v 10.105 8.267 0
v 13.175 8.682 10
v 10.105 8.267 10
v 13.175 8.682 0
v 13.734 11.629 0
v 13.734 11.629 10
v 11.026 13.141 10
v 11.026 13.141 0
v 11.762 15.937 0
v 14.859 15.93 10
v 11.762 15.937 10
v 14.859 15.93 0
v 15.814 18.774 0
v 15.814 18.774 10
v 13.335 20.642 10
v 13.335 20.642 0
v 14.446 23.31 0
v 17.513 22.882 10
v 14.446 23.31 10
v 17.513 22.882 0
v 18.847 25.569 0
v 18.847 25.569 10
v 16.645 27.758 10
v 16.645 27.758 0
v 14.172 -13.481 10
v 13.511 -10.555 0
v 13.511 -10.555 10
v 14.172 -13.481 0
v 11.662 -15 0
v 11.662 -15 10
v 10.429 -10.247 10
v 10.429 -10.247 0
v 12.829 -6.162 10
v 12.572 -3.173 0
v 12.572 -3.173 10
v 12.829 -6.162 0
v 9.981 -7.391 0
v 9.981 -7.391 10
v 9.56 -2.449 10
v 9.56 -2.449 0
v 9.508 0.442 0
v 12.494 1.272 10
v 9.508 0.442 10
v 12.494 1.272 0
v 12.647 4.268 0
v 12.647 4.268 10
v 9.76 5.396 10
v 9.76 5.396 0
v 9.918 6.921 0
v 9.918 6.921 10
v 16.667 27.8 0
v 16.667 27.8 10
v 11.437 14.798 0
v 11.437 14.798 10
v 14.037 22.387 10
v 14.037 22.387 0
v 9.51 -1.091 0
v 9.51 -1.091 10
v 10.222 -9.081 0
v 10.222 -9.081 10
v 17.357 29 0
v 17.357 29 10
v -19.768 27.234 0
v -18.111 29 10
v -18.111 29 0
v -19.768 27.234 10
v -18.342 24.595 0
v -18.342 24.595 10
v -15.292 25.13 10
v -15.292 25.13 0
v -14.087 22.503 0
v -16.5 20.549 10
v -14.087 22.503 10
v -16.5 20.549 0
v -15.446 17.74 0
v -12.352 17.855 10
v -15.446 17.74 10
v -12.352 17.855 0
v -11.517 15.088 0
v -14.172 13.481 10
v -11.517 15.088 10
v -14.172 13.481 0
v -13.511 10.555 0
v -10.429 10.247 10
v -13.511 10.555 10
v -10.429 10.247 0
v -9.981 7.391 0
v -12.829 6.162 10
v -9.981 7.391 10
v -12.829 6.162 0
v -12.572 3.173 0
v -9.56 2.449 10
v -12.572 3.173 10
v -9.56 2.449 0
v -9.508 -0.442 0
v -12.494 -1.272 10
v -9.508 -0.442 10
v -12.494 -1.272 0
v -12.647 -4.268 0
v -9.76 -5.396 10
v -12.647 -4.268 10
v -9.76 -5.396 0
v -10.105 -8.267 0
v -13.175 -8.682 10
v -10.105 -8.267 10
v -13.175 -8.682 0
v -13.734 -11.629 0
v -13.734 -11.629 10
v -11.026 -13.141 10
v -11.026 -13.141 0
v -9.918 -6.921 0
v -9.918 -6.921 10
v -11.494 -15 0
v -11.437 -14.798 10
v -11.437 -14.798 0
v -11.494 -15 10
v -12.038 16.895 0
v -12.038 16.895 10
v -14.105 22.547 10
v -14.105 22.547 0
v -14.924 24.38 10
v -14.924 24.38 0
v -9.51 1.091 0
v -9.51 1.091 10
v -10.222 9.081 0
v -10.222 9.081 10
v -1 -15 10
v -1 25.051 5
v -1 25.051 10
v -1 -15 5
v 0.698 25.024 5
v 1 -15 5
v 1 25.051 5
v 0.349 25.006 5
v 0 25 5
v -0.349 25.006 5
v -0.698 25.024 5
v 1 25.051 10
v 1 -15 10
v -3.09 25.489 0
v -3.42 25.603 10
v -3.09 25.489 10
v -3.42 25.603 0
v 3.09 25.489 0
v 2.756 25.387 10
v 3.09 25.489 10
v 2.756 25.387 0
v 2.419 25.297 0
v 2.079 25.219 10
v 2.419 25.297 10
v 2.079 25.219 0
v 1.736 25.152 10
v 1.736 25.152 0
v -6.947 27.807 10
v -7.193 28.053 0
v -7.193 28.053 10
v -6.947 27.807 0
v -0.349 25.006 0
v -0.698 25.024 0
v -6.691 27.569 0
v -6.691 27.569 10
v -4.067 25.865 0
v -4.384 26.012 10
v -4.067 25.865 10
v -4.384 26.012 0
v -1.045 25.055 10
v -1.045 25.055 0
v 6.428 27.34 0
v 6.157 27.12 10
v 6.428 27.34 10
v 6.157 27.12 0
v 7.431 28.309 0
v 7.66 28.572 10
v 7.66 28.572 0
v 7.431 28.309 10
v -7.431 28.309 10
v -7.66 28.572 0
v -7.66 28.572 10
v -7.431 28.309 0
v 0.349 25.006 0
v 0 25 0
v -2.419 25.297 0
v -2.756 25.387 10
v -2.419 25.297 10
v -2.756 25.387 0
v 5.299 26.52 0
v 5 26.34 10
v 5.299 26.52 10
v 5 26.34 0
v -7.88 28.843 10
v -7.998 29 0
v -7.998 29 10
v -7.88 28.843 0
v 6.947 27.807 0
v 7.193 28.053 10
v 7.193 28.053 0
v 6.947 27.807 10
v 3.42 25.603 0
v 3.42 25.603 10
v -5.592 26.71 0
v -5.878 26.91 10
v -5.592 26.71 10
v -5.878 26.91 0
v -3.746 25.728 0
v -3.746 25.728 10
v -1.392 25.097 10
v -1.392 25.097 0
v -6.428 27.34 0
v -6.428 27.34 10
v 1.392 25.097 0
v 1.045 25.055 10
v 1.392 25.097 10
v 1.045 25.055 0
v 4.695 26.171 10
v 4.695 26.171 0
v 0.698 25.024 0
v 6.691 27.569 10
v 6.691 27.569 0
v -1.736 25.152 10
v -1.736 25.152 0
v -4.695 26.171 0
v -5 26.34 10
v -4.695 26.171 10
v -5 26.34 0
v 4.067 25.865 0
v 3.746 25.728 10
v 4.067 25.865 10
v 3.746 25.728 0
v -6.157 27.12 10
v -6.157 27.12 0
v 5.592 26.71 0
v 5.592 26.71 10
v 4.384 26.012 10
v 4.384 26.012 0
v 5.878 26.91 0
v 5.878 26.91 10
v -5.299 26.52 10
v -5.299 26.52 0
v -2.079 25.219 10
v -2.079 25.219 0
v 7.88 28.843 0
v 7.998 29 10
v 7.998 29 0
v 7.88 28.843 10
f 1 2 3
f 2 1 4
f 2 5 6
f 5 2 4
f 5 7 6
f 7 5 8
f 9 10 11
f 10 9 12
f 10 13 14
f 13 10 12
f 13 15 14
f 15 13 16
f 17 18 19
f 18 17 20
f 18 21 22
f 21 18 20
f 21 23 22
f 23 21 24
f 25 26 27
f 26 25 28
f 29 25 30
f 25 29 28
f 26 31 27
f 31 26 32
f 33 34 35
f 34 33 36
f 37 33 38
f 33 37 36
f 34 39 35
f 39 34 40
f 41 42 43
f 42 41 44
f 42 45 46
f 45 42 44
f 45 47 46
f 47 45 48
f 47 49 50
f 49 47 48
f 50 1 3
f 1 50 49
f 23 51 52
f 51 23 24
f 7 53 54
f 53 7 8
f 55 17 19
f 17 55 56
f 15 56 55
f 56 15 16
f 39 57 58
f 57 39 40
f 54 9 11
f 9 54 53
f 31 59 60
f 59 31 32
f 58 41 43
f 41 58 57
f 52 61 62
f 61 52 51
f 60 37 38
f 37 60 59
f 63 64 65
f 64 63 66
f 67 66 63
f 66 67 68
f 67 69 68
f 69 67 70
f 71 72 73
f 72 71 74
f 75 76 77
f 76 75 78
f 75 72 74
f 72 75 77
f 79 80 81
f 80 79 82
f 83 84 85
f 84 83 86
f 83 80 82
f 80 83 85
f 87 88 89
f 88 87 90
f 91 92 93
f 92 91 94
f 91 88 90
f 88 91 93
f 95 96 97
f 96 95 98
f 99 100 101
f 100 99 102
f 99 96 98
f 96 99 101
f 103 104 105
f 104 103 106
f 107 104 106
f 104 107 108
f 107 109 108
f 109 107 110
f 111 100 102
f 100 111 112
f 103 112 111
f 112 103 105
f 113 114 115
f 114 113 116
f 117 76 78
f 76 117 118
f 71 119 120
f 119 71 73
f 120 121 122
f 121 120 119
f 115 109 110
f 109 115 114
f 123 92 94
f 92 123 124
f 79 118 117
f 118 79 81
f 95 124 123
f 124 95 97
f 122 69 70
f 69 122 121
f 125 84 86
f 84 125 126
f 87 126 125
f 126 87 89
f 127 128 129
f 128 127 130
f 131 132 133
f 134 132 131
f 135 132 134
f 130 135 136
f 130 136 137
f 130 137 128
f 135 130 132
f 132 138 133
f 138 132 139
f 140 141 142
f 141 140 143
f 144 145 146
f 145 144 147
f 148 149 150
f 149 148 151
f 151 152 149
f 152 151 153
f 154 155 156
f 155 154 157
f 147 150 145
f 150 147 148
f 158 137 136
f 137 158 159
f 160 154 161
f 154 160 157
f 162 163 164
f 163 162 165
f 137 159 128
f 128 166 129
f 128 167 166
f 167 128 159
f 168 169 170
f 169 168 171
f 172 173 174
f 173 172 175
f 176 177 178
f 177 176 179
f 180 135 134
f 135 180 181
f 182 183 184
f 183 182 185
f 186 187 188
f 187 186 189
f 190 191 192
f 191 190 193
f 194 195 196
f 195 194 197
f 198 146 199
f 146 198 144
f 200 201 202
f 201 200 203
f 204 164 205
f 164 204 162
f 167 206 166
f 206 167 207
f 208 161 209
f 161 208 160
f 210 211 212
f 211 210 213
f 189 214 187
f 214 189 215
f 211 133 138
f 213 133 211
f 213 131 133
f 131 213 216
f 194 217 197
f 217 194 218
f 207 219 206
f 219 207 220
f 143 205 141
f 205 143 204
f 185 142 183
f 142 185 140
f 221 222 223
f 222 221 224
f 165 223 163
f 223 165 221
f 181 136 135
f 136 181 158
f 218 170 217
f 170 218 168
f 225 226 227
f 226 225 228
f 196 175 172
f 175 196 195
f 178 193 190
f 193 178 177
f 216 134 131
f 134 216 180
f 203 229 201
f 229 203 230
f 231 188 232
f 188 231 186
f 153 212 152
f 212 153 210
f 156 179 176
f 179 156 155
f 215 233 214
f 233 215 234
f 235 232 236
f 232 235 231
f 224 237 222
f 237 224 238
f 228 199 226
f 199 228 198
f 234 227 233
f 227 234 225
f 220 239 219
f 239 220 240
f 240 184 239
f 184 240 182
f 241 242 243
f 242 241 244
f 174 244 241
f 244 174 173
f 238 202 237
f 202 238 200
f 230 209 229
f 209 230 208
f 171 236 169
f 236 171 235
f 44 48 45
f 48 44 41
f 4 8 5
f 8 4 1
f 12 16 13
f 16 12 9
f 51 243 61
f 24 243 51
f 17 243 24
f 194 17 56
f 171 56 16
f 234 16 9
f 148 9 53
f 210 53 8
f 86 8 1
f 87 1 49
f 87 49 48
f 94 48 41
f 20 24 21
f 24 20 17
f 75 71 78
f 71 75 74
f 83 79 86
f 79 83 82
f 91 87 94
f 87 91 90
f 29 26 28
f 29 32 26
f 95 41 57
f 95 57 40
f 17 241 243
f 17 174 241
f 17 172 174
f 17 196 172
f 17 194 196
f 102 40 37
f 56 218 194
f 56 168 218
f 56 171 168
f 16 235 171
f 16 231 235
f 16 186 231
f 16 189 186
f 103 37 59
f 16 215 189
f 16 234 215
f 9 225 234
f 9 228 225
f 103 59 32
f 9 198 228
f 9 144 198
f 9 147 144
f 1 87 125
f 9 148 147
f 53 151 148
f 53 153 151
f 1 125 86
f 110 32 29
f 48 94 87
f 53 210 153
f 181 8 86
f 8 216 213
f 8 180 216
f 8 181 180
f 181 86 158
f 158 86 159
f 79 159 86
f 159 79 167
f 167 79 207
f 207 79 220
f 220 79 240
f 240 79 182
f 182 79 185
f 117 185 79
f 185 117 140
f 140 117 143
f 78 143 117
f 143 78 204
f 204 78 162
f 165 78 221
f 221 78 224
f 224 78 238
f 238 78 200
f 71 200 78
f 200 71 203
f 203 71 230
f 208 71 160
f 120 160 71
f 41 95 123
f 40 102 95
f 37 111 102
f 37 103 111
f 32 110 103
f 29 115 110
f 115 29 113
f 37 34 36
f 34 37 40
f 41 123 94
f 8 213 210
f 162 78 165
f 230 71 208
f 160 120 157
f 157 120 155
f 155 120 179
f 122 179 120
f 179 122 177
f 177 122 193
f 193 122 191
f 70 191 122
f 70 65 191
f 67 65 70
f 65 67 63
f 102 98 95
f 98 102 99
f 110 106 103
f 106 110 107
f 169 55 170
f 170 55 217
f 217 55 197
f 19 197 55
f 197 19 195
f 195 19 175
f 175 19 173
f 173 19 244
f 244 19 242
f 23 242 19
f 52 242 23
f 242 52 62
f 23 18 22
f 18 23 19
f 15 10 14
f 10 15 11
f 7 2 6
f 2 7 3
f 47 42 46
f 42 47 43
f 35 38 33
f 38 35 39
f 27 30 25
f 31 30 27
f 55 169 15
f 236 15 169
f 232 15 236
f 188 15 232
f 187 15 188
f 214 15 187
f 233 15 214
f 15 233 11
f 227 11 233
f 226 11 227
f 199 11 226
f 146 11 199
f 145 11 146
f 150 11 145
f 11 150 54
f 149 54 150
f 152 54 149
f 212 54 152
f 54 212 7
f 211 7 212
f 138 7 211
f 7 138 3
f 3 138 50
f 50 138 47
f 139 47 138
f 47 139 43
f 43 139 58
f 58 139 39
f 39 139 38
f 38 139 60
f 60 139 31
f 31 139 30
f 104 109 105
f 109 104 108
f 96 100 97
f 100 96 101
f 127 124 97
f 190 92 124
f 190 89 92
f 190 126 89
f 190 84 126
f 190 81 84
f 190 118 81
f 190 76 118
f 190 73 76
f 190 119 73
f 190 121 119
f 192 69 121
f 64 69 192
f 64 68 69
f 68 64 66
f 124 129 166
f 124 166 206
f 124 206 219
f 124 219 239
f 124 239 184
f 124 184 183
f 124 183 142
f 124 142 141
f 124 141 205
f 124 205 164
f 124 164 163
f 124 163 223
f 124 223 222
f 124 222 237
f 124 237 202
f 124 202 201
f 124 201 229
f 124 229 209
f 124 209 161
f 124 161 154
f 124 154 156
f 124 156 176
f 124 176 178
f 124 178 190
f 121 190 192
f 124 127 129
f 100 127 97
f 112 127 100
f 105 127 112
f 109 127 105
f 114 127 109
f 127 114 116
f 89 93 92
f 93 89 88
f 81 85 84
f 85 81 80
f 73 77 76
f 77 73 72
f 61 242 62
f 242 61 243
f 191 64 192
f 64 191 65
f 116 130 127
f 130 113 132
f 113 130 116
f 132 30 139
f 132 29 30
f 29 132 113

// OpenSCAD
/******************************************************************************!
 * \file camshaftLocker.scad
 * \author Sebastien Beaugrand
 * \sa http://beaugrand.chez.com/
 * \copyright CeCILL 2.1 Free Software license
 * \note Bloqueur d'arbre à cames pour Zafira A essence
 *       Not tested
 ******************************************************************************/
dPulley = 115;
rPulley = dPulley/2;
nPulley = 46;
hPulley = 10;
LTeeth = 5;
lTeeth = 3;
hTeeth = 3;
entraxe = dPulley+19;
tLocker = 29;
bLocker = 15;
hLocker = tLocker + bLocker;
lLocker = 45;

module camshaftPulley() {
    difference() {
        cylinder(h=hPulley+2, r=rPulley, $fn=180);
        for(i=[1:nPulley])
            rotate([0,0,i*(360/nPulley)])
            translate([rPulley-3,0,-1])
            linear_extrude(height=hPulley+4)
            polygon([[hTeeth*2,lTeeth/2+LTeeth-lTeeth],
                     [0,lTeeth/2],
                     [0,-lTeeth/2],
                     [hTeeth*2,-(lTeeth/2+LTeeth-lTeeth)]]);
    }
}
module camshaftLocker() {
    difference() {
        translate([entraxe/2-lLocker/2,-bLocker,0]) cube([lLocker,hLocker,hPulley]);
        union() {
            translate([0,0,-1]) rotate([0,0,180/nPulley-1]) camshaftPulley();
            translate([entraxe,0,-1]) rotate([0,0,180/nPulley-1]) camshaftPulley();
            translate([entraxe/2-1,-bLocker-1,-1]) cube([2,hLocker+2,hPulley/2+1]);
            translate([entraxe/2,tLocker+6,-1]) cylinder(h=hPulley+2, r=10, $fn=180);
        }
    }
}
rotate([0,180,0]) translate([-entraxe/2,0,-hPulley]) camshaftLocker();
